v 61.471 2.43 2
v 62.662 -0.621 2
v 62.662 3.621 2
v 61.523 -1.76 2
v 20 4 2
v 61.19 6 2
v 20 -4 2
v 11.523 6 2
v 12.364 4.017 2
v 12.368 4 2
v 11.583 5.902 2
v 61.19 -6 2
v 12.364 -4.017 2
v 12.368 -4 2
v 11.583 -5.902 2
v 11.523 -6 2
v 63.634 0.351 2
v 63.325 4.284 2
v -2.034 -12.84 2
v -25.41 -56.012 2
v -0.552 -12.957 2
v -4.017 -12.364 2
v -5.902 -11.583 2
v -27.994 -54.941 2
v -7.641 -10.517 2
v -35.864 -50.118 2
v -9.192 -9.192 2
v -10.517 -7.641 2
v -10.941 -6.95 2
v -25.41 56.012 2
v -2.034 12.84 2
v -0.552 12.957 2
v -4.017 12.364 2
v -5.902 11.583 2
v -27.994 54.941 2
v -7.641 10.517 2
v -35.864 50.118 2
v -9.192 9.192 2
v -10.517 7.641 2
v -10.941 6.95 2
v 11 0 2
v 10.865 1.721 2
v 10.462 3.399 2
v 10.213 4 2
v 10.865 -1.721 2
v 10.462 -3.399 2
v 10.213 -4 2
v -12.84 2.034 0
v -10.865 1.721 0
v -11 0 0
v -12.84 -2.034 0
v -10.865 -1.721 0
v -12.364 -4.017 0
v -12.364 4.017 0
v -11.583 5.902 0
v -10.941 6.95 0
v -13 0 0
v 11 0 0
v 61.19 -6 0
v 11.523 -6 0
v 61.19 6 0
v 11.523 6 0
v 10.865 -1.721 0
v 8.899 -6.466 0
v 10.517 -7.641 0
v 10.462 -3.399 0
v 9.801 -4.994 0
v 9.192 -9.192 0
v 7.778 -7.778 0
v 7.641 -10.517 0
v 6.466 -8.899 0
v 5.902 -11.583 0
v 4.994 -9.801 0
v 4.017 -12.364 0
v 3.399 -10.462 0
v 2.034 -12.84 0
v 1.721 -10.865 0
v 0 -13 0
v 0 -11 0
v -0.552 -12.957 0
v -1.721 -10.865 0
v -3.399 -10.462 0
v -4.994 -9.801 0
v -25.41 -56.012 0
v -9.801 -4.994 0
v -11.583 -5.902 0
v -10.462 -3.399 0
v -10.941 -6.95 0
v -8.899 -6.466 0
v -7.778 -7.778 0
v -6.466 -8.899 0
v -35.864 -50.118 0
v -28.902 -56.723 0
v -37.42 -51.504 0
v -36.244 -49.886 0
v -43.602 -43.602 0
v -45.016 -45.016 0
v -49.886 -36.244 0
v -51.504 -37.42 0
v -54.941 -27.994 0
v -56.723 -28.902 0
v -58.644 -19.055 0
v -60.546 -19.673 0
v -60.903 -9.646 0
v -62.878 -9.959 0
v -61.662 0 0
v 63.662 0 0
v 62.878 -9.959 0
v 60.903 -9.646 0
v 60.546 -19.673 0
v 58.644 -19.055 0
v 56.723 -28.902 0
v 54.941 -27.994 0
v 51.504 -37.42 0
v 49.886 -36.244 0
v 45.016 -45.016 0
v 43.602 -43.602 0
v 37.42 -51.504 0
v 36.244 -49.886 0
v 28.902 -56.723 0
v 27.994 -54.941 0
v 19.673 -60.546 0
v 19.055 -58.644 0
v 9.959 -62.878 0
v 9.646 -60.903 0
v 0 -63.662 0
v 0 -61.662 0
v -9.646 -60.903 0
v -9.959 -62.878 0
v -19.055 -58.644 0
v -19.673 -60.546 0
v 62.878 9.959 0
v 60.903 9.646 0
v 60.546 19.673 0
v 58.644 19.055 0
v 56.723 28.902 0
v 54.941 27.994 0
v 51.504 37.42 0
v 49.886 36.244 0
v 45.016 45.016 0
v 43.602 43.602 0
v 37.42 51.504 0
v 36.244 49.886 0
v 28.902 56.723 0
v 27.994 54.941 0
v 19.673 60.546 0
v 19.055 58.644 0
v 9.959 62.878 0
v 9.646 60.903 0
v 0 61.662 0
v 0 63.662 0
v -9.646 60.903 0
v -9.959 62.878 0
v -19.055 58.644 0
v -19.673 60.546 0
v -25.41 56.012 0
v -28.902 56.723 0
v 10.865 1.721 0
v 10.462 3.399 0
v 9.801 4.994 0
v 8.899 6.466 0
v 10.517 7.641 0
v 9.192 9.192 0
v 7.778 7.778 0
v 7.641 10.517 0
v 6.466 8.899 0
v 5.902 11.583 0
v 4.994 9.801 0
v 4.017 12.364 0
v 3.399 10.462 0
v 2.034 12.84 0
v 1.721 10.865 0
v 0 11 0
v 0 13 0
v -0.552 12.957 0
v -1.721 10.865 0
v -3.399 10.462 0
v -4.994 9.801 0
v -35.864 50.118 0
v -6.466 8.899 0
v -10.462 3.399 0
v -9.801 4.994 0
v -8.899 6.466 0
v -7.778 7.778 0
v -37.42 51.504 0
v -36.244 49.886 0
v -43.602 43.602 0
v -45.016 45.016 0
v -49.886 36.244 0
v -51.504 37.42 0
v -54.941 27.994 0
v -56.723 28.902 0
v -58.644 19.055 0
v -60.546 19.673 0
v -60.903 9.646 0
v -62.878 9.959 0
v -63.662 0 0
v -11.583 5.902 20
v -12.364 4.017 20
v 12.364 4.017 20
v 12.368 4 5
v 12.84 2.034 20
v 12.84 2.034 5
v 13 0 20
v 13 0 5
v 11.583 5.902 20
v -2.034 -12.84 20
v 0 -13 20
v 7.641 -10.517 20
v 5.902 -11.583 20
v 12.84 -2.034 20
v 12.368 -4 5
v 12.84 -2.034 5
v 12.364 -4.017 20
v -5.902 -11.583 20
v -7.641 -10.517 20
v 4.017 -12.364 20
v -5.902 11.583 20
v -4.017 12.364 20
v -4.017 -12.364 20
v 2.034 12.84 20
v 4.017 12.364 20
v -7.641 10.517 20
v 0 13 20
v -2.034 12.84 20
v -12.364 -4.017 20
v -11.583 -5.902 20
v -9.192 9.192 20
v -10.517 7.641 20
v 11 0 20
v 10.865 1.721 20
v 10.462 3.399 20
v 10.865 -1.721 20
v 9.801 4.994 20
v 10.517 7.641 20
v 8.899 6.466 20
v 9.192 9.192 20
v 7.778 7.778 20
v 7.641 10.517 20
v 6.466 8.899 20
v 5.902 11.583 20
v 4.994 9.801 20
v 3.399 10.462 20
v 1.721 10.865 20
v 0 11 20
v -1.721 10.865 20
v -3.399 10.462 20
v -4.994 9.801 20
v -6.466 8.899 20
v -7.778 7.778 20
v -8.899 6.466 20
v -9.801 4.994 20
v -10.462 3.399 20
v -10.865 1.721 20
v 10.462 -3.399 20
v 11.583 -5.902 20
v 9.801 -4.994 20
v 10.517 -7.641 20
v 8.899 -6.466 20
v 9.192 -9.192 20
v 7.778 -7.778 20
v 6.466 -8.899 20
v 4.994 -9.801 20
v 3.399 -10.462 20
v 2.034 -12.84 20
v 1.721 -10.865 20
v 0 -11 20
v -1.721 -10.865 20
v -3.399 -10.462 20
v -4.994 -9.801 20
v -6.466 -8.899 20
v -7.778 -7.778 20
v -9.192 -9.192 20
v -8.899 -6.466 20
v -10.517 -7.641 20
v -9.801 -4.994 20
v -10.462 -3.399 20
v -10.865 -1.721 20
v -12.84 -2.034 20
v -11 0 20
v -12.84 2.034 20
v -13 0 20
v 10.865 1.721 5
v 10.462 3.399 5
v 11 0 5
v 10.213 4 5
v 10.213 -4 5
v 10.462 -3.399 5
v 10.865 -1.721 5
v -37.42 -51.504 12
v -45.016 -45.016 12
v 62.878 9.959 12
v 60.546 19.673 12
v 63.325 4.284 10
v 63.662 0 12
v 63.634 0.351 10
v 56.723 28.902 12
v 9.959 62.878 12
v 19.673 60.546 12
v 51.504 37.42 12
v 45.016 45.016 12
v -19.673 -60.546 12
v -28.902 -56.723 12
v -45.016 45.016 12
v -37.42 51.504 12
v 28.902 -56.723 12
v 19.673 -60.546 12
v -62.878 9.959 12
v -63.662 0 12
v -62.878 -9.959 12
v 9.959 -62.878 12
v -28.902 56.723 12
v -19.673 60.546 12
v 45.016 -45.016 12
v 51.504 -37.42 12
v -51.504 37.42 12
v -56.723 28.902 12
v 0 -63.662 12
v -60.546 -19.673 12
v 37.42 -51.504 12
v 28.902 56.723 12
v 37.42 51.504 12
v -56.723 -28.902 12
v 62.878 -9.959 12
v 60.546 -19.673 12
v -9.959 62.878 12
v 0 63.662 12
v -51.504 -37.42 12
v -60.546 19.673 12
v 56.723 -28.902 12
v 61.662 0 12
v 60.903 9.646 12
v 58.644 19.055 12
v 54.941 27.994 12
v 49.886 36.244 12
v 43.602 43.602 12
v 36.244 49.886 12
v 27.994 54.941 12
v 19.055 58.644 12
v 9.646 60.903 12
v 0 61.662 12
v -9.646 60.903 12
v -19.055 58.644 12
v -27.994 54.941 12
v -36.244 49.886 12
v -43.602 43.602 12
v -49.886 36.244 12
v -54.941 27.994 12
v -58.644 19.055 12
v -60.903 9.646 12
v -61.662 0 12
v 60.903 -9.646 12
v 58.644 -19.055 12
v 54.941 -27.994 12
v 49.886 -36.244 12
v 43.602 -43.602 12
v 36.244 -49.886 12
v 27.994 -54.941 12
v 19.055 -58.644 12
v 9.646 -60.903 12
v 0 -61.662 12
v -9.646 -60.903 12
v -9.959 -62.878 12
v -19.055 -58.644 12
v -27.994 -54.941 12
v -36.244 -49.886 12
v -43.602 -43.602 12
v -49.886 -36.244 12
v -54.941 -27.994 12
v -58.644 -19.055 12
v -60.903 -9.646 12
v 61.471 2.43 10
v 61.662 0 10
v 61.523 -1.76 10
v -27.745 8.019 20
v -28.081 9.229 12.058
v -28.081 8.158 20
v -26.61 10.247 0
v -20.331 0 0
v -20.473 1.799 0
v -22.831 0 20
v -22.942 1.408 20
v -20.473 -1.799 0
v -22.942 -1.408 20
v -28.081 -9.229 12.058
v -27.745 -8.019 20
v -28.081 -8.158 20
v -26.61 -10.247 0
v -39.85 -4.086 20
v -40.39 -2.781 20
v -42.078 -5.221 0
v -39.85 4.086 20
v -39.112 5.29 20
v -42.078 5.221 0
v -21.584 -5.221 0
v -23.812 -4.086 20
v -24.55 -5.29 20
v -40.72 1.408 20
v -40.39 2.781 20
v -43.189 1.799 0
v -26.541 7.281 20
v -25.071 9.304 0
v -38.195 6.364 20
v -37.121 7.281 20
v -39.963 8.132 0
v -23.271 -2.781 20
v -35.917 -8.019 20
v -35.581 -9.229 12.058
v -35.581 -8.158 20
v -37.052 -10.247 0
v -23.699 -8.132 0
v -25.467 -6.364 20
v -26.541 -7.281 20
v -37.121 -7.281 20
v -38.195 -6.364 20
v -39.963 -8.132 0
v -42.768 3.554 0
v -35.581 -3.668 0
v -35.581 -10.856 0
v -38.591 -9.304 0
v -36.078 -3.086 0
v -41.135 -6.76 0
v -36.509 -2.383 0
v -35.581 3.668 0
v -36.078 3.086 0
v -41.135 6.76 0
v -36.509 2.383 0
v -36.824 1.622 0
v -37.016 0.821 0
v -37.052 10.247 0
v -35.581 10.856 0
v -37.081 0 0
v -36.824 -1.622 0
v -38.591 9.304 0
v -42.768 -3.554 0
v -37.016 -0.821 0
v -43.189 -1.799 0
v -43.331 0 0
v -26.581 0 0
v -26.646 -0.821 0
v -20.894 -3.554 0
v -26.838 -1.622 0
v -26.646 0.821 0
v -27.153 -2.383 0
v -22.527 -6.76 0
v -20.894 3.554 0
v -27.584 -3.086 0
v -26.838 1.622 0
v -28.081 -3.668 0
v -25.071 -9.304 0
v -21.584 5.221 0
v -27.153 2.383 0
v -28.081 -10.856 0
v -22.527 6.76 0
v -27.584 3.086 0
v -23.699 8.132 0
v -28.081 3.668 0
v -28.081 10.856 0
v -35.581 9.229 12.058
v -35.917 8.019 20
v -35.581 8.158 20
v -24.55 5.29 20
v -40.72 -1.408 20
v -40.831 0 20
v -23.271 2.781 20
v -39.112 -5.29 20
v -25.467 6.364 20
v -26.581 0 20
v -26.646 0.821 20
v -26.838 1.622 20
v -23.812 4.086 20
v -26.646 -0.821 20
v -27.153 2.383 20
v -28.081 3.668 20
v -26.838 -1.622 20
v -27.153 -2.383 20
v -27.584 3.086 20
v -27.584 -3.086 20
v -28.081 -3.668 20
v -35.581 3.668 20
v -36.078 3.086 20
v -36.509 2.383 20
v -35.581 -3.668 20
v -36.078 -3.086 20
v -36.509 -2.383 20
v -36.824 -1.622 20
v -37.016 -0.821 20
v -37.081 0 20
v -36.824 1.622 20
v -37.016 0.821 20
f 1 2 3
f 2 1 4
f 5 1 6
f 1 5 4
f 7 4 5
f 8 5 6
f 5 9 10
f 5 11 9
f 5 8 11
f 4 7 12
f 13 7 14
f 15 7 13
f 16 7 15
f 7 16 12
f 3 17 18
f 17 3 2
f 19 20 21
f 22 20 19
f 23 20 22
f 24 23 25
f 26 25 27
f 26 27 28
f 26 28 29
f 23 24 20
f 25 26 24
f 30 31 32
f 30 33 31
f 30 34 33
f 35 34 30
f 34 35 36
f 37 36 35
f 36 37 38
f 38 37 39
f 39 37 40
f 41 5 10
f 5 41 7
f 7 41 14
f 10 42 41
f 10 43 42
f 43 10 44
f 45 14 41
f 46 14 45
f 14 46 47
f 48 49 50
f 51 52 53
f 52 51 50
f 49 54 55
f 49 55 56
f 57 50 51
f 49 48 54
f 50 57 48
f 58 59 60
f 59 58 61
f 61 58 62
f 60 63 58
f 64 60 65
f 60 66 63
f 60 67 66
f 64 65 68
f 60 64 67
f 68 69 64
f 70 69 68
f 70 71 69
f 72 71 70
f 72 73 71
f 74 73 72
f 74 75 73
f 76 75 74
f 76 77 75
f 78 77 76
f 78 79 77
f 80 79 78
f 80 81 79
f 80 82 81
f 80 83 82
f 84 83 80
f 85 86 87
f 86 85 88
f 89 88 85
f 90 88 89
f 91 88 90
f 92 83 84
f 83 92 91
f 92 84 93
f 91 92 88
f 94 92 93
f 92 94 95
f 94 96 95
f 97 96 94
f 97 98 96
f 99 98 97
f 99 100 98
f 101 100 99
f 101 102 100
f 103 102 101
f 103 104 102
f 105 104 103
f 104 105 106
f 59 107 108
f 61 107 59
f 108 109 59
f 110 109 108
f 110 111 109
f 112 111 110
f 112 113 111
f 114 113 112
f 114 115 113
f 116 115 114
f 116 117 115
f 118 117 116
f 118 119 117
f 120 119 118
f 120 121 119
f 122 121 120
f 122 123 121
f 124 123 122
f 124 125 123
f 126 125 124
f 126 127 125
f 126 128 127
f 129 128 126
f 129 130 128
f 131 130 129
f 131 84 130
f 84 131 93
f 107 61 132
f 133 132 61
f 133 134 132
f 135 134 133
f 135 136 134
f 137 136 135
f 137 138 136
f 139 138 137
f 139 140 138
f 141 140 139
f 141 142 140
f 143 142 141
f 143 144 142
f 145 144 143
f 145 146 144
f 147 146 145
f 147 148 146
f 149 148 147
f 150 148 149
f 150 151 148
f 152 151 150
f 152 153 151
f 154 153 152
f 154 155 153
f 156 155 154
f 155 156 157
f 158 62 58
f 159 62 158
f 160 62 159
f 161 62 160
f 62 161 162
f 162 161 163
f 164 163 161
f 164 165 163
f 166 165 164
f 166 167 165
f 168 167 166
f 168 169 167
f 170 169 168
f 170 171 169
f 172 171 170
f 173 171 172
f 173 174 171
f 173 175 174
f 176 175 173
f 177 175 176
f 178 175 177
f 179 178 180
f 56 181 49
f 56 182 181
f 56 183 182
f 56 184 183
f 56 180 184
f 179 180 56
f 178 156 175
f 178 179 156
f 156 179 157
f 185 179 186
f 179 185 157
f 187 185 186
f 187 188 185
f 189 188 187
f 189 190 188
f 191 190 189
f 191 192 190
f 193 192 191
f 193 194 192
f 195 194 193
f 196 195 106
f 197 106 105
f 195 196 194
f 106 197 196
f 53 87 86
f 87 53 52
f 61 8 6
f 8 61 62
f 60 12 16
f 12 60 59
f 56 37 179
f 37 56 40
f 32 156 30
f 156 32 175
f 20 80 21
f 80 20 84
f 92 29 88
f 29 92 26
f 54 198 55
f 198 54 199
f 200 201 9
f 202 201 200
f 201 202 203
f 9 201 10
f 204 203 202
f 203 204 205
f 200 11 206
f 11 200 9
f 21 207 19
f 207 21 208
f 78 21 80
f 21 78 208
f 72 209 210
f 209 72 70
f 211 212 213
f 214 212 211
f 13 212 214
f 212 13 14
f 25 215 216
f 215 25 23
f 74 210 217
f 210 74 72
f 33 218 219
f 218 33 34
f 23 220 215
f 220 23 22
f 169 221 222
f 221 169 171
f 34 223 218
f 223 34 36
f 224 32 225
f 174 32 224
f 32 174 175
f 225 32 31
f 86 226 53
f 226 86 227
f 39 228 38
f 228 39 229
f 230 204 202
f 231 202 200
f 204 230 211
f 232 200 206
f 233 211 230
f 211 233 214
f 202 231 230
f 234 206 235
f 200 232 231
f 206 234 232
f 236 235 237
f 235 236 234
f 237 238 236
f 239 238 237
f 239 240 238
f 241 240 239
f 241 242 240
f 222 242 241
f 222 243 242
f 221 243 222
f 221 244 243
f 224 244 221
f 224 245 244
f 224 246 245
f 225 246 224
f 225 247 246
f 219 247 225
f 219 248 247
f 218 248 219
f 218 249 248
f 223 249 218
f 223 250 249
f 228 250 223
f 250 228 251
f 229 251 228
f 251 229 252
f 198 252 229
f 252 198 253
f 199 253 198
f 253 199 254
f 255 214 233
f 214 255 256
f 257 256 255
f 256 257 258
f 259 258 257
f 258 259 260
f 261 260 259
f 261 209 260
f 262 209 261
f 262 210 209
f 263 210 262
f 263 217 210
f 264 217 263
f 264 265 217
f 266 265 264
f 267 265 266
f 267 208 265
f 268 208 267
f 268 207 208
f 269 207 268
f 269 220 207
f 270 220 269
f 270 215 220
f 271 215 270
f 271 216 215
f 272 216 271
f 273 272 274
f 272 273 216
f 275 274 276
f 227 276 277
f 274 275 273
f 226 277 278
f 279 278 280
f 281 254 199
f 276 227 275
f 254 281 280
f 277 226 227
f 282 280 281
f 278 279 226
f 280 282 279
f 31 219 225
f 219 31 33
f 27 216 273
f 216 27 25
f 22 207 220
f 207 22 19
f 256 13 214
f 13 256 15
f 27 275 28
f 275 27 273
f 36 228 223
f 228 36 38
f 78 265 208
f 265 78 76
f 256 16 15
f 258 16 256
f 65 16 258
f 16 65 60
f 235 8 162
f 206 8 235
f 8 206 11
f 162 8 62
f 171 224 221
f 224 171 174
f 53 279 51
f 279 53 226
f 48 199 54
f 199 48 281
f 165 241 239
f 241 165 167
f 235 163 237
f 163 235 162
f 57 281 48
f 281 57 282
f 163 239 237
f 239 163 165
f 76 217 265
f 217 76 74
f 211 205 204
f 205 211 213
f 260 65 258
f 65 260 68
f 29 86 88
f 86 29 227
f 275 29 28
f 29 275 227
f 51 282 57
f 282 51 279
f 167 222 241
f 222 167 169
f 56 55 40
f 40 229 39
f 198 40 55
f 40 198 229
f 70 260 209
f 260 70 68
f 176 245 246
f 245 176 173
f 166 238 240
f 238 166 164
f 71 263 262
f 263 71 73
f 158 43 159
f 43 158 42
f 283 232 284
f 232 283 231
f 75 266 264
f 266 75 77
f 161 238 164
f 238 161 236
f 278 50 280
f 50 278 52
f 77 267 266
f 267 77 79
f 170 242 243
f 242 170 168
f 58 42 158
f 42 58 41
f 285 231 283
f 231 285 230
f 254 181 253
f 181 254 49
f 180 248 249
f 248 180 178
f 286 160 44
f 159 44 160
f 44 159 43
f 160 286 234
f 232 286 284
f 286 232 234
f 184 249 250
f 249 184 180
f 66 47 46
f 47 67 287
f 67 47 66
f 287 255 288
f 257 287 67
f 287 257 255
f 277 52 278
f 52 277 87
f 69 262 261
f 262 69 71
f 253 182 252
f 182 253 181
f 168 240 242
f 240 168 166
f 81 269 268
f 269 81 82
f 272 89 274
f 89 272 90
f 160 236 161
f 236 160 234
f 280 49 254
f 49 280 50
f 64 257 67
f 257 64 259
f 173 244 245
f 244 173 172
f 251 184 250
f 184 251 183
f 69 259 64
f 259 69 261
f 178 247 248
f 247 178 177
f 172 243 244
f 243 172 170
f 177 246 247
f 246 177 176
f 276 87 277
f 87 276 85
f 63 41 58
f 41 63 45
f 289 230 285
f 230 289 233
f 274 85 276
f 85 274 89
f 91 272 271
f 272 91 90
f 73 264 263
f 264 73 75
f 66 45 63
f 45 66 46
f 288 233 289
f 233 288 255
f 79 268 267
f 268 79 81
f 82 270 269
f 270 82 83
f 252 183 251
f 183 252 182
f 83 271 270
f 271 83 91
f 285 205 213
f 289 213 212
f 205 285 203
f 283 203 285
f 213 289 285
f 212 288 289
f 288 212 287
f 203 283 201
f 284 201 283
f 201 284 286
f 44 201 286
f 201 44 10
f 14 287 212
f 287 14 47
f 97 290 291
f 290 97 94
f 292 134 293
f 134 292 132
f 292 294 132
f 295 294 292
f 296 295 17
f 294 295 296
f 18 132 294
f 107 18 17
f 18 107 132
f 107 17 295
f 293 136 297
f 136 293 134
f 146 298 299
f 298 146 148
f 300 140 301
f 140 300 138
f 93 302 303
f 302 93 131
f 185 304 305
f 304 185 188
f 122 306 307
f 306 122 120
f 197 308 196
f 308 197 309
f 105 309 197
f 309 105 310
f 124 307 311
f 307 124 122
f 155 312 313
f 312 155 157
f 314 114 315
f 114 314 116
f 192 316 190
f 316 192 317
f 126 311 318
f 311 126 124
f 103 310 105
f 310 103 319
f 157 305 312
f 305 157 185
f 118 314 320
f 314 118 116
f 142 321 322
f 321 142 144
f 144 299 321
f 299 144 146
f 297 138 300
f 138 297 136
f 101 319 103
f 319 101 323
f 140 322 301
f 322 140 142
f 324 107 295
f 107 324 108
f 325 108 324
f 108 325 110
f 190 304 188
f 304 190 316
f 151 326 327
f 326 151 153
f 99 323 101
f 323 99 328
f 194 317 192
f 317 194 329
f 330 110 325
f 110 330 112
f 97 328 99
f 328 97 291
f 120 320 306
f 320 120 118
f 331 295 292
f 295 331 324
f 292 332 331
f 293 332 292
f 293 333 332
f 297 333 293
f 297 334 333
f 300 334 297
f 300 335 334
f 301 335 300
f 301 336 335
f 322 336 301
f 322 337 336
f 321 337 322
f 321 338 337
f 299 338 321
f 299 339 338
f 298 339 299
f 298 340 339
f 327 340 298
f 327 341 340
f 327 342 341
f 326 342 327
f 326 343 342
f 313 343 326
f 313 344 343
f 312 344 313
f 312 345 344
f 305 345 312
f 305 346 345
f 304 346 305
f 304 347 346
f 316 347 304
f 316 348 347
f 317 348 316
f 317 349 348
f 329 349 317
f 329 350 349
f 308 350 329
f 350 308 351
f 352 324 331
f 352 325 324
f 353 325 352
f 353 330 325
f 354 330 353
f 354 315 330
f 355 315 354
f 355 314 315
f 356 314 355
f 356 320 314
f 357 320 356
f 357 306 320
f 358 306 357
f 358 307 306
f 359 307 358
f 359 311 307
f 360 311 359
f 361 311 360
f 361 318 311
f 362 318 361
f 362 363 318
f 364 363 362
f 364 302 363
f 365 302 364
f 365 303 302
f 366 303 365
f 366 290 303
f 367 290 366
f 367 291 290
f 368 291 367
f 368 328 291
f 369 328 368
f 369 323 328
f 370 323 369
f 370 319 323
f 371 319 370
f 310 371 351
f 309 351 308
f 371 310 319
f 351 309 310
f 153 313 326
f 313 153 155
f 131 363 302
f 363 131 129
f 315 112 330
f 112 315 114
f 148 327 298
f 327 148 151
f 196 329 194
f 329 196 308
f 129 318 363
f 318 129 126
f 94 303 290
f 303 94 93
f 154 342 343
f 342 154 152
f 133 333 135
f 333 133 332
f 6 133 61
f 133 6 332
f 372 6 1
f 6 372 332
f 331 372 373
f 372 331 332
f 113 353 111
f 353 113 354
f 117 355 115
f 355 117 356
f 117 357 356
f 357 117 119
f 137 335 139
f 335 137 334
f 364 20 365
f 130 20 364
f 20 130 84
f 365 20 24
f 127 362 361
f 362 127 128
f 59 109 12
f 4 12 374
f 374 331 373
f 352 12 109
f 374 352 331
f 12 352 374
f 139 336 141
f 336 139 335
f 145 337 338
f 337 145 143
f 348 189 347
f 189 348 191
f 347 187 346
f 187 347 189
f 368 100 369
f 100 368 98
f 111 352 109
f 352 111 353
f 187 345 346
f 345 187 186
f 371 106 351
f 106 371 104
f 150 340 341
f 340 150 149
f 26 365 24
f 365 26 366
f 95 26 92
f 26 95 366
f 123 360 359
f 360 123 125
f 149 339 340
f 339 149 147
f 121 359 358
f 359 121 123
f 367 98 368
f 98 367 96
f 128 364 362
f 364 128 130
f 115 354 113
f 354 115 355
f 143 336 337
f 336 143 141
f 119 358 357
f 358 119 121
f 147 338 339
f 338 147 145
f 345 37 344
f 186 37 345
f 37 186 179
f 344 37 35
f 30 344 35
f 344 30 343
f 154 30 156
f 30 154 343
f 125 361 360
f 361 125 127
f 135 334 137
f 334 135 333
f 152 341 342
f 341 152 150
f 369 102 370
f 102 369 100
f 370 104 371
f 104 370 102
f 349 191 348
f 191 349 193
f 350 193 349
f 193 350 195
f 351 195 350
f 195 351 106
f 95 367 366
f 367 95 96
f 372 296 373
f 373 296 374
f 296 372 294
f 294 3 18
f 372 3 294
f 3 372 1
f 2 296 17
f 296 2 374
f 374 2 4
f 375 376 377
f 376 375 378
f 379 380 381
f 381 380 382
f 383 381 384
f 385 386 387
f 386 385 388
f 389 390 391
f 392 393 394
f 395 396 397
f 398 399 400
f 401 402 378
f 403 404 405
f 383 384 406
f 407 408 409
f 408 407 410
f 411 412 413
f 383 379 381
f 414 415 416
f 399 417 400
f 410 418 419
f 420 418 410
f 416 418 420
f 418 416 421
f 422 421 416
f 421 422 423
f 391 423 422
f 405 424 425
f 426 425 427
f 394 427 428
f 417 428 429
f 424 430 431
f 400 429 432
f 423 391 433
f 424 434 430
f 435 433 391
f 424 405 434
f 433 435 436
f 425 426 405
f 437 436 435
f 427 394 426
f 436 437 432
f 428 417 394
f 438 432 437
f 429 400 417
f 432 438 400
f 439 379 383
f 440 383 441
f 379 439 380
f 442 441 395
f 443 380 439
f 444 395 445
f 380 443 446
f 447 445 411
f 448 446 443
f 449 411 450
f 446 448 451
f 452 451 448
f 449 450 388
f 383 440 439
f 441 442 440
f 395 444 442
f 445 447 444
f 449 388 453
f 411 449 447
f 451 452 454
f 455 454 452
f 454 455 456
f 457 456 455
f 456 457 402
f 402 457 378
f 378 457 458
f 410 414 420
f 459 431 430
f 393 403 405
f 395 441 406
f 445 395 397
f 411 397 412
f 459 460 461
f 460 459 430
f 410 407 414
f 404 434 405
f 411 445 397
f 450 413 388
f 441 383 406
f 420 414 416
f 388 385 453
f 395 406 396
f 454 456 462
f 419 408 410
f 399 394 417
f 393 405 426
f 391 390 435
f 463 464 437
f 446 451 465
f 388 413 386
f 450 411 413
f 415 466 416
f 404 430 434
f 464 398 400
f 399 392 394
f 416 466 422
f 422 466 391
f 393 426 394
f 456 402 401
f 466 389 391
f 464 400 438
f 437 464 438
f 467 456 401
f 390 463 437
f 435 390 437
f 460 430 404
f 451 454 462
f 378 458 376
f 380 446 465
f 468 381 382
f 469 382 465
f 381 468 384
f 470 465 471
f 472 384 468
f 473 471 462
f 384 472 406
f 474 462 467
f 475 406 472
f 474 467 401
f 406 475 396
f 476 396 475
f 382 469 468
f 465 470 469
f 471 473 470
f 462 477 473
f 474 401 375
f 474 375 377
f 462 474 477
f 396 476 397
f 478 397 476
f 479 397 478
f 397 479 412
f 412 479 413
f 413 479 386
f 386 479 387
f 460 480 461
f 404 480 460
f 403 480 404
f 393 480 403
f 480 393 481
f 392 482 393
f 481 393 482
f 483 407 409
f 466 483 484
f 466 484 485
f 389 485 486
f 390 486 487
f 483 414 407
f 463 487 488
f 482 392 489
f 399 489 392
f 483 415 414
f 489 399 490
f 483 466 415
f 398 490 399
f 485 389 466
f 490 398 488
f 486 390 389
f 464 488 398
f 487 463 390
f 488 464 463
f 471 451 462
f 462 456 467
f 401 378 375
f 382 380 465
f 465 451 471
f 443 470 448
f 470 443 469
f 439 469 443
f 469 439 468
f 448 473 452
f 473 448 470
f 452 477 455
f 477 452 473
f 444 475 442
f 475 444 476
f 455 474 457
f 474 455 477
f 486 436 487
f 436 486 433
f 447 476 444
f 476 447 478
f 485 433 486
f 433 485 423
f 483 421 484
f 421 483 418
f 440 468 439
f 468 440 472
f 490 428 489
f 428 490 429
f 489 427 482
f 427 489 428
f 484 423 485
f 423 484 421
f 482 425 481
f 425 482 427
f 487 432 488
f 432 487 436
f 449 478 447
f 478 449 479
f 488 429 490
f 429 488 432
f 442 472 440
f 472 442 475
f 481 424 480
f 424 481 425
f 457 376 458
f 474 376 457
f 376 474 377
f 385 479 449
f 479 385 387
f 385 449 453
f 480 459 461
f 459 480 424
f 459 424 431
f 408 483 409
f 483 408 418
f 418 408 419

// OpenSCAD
$fn=40;

circumference = 400; // 24 led of 60/m strip
ledHeight = 12;
mountHeight = 20;
thick = 2;
bigHole = 11;
littleHole = 5.25;

outerR = circumference / PI / 2;

//exploded_view();
plated_view();


module plated_view() {
    mount();
    translate([-outerR/2,0,mountHeight]) scale([1,1,-1]) pegs();
}

module exploded_view() {
    mount();
    translate([0,0,40]) pegs();
}
module mount() {

    difference() {
        union() {
            //connecting struts
            for(rot = [0,120,240]) {
                rotate([0,0,rot])
                    translate([0,-ledHeight/2,0])
                        cube(size=[outerR-(thick/2),ledHeight,thick]);    
            }
            // centre mount
            cylinder(r = bigHole+thick, h = mountHeight);
        }

        translate([0,0,-1]) cylinder(r = bigHole, h = mountHeight+2);
        
        // Wire hole
        translate([10,-4,2]) cube(size=[10,8,3]);
    };

    // Outer ring
    difference() {
        cylinder(r = outerR, h = ledHeight);
        translate([0,0,-1]) cylinder(r = outerR-thick, h = ledHeight+2);
        // Wire hole
       translate([outerR,2.5,ledHeight/2]) rotate([0,0,45]) cube(size=[10,3,8], center=true);
        
    };
}

module pegs() {
    difference() {
        cylinder(r1 = bigHole - 2, r2 = bigHole + 0.5, h = mountHeight);
        translate([0,0,-1]) cylinder(r = littleHole, h = mountHeight+2);
        translate([0,0,mountHeight/2])
            cube([littleHole*2-3, bigHole*2+2, mountHeight+2], center=true);
    }
}
